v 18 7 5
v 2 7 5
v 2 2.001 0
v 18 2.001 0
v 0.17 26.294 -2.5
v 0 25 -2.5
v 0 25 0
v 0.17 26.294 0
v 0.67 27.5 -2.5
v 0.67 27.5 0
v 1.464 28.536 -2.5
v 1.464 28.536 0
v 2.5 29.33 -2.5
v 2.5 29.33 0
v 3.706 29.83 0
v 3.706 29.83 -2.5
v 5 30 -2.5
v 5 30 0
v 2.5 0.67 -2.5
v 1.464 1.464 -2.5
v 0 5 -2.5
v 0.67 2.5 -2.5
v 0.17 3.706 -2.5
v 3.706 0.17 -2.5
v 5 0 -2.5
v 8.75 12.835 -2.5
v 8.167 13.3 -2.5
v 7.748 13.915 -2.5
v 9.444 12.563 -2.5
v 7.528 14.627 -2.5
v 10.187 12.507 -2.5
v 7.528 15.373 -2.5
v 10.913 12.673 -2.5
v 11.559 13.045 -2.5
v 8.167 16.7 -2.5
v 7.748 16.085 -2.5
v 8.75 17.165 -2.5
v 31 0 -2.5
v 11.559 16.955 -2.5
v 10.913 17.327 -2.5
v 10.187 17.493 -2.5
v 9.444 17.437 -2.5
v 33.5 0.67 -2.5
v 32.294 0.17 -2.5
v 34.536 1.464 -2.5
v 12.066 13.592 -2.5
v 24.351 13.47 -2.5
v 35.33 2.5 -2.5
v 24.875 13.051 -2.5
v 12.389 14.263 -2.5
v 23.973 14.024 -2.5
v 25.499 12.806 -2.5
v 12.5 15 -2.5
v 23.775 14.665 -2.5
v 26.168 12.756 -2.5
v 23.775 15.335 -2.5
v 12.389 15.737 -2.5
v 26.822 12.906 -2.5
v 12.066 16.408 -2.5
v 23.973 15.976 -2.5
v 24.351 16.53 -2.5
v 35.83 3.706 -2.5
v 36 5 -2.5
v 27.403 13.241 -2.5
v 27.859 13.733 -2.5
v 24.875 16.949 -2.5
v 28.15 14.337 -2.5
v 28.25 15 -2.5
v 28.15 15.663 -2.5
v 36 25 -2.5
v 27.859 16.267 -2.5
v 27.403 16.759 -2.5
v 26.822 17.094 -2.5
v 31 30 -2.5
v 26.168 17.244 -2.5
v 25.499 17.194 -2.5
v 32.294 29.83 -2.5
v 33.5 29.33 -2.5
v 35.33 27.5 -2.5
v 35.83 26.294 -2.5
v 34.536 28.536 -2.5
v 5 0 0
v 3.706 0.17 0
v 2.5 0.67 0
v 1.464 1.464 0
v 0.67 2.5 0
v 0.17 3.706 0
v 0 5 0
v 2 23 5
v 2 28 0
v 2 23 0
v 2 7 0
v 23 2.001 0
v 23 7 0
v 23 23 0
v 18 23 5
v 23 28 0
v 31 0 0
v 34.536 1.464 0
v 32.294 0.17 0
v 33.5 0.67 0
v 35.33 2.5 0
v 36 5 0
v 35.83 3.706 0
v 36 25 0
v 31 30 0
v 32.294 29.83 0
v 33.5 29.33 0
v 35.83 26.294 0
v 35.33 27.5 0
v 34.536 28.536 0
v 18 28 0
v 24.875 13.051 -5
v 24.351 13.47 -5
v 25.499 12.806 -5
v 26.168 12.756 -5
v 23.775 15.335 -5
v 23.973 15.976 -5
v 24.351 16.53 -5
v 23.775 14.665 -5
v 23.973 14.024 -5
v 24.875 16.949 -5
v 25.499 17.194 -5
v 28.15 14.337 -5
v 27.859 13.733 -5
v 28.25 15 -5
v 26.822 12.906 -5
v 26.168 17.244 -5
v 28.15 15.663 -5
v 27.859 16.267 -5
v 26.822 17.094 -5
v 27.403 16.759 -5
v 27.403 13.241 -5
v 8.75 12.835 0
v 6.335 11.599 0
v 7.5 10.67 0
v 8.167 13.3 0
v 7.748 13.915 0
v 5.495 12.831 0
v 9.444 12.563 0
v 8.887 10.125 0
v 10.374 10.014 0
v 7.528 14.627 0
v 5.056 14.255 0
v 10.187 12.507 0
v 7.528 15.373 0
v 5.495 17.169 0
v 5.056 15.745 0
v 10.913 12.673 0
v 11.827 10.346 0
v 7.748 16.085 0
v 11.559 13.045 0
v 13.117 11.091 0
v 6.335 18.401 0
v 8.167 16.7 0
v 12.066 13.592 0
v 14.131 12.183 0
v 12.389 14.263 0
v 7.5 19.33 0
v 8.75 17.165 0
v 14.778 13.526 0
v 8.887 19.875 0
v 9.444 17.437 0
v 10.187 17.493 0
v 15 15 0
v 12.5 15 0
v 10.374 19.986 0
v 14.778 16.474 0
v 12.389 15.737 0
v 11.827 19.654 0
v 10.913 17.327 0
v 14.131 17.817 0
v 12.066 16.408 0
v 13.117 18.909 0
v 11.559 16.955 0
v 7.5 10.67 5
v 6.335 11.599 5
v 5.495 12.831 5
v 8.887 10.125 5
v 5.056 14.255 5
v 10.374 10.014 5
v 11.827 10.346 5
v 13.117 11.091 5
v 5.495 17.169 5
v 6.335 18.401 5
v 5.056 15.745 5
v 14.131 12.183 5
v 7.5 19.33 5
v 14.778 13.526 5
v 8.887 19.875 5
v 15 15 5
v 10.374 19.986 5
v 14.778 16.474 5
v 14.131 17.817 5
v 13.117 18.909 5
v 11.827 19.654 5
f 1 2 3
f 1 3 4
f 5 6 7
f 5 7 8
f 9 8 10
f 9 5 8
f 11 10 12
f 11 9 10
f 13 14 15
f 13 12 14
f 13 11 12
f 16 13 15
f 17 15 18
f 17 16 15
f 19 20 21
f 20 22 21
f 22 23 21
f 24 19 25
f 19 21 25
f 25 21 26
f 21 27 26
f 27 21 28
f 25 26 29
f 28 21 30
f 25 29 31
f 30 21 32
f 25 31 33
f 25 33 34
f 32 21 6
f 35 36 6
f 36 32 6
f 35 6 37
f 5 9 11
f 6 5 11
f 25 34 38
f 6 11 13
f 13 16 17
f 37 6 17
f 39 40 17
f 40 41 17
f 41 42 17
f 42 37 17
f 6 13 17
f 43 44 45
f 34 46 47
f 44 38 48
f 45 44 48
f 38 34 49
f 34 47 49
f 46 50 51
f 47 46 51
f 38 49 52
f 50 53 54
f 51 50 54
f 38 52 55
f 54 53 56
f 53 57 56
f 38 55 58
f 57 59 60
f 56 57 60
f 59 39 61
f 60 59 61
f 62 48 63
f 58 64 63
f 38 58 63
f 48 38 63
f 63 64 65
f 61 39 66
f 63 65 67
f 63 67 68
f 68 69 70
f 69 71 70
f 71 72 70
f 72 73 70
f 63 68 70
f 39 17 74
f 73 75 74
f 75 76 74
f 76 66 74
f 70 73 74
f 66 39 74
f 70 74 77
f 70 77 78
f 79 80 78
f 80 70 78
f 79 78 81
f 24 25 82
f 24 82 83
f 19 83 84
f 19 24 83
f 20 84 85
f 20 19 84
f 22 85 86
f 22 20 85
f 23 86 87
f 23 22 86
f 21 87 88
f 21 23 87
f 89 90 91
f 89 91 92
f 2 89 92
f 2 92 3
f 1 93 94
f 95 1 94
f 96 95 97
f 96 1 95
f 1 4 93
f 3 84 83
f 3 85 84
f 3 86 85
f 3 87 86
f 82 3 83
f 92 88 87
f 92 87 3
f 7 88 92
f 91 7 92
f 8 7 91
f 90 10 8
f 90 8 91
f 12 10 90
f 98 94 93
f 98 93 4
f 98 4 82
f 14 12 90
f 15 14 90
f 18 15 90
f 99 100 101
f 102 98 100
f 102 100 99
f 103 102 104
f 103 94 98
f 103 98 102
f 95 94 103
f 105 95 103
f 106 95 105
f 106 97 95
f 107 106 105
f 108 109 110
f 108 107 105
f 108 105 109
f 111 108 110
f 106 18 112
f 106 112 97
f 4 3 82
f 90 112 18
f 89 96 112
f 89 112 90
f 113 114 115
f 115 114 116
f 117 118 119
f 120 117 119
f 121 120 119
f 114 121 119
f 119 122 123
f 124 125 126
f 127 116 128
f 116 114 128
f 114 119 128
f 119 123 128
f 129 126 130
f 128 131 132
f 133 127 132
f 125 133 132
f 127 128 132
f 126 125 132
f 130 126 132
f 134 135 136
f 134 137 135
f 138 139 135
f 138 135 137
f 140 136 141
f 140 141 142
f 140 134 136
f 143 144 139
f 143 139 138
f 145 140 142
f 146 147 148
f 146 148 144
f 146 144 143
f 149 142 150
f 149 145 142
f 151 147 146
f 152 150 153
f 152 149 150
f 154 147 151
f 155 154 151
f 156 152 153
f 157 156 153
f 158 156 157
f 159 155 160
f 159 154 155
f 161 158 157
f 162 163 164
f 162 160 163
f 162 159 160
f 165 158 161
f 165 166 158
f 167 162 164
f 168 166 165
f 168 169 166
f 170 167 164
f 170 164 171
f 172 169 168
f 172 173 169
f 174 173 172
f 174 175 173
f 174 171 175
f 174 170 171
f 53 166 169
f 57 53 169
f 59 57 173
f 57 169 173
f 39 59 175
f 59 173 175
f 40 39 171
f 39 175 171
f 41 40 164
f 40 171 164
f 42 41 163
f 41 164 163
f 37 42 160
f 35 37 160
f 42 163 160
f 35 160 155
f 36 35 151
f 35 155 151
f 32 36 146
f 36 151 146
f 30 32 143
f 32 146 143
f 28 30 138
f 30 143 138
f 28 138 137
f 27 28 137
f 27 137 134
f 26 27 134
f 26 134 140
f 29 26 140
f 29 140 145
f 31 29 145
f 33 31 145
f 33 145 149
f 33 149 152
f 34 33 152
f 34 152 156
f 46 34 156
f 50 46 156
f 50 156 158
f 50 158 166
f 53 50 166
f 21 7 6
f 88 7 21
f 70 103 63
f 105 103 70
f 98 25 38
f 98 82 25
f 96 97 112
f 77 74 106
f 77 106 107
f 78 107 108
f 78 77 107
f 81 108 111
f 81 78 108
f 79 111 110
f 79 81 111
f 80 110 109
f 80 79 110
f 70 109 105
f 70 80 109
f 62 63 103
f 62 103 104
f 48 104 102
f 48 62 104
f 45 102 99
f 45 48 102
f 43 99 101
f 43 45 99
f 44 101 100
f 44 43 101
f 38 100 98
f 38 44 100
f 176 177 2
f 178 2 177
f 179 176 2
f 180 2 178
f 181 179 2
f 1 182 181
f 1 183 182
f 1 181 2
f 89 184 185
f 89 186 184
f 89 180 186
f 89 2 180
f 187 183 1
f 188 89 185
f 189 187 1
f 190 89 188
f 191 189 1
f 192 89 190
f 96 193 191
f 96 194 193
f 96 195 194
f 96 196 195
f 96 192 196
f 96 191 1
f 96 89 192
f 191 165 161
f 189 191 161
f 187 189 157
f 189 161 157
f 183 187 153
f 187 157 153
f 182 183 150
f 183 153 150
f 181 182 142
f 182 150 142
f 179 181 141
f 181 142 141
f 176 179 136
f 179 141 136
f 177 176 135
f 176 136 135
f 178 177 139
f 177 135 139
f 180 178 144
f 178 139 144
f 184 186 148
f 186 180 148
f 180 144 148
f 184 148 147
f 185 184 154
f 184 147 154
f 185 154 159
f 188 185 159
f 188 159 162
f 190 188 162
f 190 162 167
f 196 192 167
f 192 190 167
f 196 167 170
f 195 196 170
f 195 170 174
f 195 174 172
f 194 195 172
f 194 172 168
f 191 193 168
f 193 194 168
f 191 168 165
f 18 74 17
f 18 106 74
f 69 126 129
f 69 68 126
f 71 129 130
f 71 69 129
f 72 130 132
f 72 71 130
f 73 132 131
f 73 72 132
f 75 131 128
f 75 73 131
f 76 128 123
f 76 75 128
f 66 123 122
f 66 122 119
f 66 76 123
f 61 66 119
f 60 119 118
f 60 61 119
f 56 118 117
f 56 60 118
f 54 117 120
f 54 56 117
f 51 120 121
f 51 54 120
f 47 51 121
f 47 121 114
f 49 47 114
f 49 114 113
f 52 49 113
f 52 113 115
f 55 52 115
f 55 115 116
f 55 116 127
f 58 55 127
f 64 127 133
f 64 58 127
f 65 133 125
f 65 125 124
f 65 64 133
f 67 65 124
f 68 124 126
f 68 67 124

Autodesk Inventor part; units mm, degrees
ref_plane "YZ Plane" through (0, 0, 0) normal (1, 0, 0) x (0, 1, 0)
ref_plane "XZ Plane" through (0, 0, 0) normal (0, 1, 0) x (-1, 0, 0)
ref_plane "XY Plane" through (0, 0, 0) normal (0, 0, 1) x (1, 0, 0)
sketch "Sketch1" plane through (0, 0, 0) normal (0, 0, 1) x (1, 0, 0)
  line L0 (0, 0) -> (36, 0)
  line L1 (36, 0) -> (36, 30)
  line L2 (36, 30) -> (0, 30)
  line L3 (0, 30) -> (0, 0)
  circle A0 centre (10, 15) radius 2.5
  circle A1 centre (26, 15) radius 2.25
  line L4 (0, 0) -> (36, 0)
  line L5 (2, 7) -> (18, 7)
  line L6 (18, 7) -> (18, 23)
  line L7 (18, 23) -> (2, 23)
  line L8 (2, 23) -> (2, 7)
  circle A2 centre (10, 15) radius 5
  dimension "d0" = 10
  dimension "d1" = 16
  dimension "d2" = 4.5
  dimension "d3" = 5
  dimension "d4" = 15
  dimension "d5" = 15
  dimension "d6" = 10
  dimension "d7" = 15
  dimension "d15" = 10
  dimension "d16" = 8
  dimension "d17" = 8
  dimension "d18" = 8
  dimension "d19" = 8
extrude "Extrusion1" add sketch "Sketch1" against normal blind 2.5 contours L3 L2 L1 L0 | L8 L7 L6 L5 | A2
extrude "Extrusion3" add sketch "Sketch1" against normal blind 5 contours A1
extrude "Extrusion4" add sketch "Sketch1" along normal blind 5 contours L8 L7 L6 L5
chamfer "Chamfer1" distance 5 angle 45 1 edges at (18, 15, 0)
chamfer "Chamfer2" distance 5 angle 45 1 edges at (10, 7, 0)
chamfer "Chamfer4" distance 5 angle 45 1 edges at (10, 23, 0)
fillet "Fillet1" radius 5 1 edges at (36, 30, -1.25)
fillet "Fillet2" radius 5 1 edges at (0, 30, -1.25)
fillet "Fillet3" radius 5 1 edges at (36, 0, -1.25)
fillet "Fillet4" radius 5 1 edges at (0, 0, -1.25)
properties part number "keithley_2000_rear_feet"
